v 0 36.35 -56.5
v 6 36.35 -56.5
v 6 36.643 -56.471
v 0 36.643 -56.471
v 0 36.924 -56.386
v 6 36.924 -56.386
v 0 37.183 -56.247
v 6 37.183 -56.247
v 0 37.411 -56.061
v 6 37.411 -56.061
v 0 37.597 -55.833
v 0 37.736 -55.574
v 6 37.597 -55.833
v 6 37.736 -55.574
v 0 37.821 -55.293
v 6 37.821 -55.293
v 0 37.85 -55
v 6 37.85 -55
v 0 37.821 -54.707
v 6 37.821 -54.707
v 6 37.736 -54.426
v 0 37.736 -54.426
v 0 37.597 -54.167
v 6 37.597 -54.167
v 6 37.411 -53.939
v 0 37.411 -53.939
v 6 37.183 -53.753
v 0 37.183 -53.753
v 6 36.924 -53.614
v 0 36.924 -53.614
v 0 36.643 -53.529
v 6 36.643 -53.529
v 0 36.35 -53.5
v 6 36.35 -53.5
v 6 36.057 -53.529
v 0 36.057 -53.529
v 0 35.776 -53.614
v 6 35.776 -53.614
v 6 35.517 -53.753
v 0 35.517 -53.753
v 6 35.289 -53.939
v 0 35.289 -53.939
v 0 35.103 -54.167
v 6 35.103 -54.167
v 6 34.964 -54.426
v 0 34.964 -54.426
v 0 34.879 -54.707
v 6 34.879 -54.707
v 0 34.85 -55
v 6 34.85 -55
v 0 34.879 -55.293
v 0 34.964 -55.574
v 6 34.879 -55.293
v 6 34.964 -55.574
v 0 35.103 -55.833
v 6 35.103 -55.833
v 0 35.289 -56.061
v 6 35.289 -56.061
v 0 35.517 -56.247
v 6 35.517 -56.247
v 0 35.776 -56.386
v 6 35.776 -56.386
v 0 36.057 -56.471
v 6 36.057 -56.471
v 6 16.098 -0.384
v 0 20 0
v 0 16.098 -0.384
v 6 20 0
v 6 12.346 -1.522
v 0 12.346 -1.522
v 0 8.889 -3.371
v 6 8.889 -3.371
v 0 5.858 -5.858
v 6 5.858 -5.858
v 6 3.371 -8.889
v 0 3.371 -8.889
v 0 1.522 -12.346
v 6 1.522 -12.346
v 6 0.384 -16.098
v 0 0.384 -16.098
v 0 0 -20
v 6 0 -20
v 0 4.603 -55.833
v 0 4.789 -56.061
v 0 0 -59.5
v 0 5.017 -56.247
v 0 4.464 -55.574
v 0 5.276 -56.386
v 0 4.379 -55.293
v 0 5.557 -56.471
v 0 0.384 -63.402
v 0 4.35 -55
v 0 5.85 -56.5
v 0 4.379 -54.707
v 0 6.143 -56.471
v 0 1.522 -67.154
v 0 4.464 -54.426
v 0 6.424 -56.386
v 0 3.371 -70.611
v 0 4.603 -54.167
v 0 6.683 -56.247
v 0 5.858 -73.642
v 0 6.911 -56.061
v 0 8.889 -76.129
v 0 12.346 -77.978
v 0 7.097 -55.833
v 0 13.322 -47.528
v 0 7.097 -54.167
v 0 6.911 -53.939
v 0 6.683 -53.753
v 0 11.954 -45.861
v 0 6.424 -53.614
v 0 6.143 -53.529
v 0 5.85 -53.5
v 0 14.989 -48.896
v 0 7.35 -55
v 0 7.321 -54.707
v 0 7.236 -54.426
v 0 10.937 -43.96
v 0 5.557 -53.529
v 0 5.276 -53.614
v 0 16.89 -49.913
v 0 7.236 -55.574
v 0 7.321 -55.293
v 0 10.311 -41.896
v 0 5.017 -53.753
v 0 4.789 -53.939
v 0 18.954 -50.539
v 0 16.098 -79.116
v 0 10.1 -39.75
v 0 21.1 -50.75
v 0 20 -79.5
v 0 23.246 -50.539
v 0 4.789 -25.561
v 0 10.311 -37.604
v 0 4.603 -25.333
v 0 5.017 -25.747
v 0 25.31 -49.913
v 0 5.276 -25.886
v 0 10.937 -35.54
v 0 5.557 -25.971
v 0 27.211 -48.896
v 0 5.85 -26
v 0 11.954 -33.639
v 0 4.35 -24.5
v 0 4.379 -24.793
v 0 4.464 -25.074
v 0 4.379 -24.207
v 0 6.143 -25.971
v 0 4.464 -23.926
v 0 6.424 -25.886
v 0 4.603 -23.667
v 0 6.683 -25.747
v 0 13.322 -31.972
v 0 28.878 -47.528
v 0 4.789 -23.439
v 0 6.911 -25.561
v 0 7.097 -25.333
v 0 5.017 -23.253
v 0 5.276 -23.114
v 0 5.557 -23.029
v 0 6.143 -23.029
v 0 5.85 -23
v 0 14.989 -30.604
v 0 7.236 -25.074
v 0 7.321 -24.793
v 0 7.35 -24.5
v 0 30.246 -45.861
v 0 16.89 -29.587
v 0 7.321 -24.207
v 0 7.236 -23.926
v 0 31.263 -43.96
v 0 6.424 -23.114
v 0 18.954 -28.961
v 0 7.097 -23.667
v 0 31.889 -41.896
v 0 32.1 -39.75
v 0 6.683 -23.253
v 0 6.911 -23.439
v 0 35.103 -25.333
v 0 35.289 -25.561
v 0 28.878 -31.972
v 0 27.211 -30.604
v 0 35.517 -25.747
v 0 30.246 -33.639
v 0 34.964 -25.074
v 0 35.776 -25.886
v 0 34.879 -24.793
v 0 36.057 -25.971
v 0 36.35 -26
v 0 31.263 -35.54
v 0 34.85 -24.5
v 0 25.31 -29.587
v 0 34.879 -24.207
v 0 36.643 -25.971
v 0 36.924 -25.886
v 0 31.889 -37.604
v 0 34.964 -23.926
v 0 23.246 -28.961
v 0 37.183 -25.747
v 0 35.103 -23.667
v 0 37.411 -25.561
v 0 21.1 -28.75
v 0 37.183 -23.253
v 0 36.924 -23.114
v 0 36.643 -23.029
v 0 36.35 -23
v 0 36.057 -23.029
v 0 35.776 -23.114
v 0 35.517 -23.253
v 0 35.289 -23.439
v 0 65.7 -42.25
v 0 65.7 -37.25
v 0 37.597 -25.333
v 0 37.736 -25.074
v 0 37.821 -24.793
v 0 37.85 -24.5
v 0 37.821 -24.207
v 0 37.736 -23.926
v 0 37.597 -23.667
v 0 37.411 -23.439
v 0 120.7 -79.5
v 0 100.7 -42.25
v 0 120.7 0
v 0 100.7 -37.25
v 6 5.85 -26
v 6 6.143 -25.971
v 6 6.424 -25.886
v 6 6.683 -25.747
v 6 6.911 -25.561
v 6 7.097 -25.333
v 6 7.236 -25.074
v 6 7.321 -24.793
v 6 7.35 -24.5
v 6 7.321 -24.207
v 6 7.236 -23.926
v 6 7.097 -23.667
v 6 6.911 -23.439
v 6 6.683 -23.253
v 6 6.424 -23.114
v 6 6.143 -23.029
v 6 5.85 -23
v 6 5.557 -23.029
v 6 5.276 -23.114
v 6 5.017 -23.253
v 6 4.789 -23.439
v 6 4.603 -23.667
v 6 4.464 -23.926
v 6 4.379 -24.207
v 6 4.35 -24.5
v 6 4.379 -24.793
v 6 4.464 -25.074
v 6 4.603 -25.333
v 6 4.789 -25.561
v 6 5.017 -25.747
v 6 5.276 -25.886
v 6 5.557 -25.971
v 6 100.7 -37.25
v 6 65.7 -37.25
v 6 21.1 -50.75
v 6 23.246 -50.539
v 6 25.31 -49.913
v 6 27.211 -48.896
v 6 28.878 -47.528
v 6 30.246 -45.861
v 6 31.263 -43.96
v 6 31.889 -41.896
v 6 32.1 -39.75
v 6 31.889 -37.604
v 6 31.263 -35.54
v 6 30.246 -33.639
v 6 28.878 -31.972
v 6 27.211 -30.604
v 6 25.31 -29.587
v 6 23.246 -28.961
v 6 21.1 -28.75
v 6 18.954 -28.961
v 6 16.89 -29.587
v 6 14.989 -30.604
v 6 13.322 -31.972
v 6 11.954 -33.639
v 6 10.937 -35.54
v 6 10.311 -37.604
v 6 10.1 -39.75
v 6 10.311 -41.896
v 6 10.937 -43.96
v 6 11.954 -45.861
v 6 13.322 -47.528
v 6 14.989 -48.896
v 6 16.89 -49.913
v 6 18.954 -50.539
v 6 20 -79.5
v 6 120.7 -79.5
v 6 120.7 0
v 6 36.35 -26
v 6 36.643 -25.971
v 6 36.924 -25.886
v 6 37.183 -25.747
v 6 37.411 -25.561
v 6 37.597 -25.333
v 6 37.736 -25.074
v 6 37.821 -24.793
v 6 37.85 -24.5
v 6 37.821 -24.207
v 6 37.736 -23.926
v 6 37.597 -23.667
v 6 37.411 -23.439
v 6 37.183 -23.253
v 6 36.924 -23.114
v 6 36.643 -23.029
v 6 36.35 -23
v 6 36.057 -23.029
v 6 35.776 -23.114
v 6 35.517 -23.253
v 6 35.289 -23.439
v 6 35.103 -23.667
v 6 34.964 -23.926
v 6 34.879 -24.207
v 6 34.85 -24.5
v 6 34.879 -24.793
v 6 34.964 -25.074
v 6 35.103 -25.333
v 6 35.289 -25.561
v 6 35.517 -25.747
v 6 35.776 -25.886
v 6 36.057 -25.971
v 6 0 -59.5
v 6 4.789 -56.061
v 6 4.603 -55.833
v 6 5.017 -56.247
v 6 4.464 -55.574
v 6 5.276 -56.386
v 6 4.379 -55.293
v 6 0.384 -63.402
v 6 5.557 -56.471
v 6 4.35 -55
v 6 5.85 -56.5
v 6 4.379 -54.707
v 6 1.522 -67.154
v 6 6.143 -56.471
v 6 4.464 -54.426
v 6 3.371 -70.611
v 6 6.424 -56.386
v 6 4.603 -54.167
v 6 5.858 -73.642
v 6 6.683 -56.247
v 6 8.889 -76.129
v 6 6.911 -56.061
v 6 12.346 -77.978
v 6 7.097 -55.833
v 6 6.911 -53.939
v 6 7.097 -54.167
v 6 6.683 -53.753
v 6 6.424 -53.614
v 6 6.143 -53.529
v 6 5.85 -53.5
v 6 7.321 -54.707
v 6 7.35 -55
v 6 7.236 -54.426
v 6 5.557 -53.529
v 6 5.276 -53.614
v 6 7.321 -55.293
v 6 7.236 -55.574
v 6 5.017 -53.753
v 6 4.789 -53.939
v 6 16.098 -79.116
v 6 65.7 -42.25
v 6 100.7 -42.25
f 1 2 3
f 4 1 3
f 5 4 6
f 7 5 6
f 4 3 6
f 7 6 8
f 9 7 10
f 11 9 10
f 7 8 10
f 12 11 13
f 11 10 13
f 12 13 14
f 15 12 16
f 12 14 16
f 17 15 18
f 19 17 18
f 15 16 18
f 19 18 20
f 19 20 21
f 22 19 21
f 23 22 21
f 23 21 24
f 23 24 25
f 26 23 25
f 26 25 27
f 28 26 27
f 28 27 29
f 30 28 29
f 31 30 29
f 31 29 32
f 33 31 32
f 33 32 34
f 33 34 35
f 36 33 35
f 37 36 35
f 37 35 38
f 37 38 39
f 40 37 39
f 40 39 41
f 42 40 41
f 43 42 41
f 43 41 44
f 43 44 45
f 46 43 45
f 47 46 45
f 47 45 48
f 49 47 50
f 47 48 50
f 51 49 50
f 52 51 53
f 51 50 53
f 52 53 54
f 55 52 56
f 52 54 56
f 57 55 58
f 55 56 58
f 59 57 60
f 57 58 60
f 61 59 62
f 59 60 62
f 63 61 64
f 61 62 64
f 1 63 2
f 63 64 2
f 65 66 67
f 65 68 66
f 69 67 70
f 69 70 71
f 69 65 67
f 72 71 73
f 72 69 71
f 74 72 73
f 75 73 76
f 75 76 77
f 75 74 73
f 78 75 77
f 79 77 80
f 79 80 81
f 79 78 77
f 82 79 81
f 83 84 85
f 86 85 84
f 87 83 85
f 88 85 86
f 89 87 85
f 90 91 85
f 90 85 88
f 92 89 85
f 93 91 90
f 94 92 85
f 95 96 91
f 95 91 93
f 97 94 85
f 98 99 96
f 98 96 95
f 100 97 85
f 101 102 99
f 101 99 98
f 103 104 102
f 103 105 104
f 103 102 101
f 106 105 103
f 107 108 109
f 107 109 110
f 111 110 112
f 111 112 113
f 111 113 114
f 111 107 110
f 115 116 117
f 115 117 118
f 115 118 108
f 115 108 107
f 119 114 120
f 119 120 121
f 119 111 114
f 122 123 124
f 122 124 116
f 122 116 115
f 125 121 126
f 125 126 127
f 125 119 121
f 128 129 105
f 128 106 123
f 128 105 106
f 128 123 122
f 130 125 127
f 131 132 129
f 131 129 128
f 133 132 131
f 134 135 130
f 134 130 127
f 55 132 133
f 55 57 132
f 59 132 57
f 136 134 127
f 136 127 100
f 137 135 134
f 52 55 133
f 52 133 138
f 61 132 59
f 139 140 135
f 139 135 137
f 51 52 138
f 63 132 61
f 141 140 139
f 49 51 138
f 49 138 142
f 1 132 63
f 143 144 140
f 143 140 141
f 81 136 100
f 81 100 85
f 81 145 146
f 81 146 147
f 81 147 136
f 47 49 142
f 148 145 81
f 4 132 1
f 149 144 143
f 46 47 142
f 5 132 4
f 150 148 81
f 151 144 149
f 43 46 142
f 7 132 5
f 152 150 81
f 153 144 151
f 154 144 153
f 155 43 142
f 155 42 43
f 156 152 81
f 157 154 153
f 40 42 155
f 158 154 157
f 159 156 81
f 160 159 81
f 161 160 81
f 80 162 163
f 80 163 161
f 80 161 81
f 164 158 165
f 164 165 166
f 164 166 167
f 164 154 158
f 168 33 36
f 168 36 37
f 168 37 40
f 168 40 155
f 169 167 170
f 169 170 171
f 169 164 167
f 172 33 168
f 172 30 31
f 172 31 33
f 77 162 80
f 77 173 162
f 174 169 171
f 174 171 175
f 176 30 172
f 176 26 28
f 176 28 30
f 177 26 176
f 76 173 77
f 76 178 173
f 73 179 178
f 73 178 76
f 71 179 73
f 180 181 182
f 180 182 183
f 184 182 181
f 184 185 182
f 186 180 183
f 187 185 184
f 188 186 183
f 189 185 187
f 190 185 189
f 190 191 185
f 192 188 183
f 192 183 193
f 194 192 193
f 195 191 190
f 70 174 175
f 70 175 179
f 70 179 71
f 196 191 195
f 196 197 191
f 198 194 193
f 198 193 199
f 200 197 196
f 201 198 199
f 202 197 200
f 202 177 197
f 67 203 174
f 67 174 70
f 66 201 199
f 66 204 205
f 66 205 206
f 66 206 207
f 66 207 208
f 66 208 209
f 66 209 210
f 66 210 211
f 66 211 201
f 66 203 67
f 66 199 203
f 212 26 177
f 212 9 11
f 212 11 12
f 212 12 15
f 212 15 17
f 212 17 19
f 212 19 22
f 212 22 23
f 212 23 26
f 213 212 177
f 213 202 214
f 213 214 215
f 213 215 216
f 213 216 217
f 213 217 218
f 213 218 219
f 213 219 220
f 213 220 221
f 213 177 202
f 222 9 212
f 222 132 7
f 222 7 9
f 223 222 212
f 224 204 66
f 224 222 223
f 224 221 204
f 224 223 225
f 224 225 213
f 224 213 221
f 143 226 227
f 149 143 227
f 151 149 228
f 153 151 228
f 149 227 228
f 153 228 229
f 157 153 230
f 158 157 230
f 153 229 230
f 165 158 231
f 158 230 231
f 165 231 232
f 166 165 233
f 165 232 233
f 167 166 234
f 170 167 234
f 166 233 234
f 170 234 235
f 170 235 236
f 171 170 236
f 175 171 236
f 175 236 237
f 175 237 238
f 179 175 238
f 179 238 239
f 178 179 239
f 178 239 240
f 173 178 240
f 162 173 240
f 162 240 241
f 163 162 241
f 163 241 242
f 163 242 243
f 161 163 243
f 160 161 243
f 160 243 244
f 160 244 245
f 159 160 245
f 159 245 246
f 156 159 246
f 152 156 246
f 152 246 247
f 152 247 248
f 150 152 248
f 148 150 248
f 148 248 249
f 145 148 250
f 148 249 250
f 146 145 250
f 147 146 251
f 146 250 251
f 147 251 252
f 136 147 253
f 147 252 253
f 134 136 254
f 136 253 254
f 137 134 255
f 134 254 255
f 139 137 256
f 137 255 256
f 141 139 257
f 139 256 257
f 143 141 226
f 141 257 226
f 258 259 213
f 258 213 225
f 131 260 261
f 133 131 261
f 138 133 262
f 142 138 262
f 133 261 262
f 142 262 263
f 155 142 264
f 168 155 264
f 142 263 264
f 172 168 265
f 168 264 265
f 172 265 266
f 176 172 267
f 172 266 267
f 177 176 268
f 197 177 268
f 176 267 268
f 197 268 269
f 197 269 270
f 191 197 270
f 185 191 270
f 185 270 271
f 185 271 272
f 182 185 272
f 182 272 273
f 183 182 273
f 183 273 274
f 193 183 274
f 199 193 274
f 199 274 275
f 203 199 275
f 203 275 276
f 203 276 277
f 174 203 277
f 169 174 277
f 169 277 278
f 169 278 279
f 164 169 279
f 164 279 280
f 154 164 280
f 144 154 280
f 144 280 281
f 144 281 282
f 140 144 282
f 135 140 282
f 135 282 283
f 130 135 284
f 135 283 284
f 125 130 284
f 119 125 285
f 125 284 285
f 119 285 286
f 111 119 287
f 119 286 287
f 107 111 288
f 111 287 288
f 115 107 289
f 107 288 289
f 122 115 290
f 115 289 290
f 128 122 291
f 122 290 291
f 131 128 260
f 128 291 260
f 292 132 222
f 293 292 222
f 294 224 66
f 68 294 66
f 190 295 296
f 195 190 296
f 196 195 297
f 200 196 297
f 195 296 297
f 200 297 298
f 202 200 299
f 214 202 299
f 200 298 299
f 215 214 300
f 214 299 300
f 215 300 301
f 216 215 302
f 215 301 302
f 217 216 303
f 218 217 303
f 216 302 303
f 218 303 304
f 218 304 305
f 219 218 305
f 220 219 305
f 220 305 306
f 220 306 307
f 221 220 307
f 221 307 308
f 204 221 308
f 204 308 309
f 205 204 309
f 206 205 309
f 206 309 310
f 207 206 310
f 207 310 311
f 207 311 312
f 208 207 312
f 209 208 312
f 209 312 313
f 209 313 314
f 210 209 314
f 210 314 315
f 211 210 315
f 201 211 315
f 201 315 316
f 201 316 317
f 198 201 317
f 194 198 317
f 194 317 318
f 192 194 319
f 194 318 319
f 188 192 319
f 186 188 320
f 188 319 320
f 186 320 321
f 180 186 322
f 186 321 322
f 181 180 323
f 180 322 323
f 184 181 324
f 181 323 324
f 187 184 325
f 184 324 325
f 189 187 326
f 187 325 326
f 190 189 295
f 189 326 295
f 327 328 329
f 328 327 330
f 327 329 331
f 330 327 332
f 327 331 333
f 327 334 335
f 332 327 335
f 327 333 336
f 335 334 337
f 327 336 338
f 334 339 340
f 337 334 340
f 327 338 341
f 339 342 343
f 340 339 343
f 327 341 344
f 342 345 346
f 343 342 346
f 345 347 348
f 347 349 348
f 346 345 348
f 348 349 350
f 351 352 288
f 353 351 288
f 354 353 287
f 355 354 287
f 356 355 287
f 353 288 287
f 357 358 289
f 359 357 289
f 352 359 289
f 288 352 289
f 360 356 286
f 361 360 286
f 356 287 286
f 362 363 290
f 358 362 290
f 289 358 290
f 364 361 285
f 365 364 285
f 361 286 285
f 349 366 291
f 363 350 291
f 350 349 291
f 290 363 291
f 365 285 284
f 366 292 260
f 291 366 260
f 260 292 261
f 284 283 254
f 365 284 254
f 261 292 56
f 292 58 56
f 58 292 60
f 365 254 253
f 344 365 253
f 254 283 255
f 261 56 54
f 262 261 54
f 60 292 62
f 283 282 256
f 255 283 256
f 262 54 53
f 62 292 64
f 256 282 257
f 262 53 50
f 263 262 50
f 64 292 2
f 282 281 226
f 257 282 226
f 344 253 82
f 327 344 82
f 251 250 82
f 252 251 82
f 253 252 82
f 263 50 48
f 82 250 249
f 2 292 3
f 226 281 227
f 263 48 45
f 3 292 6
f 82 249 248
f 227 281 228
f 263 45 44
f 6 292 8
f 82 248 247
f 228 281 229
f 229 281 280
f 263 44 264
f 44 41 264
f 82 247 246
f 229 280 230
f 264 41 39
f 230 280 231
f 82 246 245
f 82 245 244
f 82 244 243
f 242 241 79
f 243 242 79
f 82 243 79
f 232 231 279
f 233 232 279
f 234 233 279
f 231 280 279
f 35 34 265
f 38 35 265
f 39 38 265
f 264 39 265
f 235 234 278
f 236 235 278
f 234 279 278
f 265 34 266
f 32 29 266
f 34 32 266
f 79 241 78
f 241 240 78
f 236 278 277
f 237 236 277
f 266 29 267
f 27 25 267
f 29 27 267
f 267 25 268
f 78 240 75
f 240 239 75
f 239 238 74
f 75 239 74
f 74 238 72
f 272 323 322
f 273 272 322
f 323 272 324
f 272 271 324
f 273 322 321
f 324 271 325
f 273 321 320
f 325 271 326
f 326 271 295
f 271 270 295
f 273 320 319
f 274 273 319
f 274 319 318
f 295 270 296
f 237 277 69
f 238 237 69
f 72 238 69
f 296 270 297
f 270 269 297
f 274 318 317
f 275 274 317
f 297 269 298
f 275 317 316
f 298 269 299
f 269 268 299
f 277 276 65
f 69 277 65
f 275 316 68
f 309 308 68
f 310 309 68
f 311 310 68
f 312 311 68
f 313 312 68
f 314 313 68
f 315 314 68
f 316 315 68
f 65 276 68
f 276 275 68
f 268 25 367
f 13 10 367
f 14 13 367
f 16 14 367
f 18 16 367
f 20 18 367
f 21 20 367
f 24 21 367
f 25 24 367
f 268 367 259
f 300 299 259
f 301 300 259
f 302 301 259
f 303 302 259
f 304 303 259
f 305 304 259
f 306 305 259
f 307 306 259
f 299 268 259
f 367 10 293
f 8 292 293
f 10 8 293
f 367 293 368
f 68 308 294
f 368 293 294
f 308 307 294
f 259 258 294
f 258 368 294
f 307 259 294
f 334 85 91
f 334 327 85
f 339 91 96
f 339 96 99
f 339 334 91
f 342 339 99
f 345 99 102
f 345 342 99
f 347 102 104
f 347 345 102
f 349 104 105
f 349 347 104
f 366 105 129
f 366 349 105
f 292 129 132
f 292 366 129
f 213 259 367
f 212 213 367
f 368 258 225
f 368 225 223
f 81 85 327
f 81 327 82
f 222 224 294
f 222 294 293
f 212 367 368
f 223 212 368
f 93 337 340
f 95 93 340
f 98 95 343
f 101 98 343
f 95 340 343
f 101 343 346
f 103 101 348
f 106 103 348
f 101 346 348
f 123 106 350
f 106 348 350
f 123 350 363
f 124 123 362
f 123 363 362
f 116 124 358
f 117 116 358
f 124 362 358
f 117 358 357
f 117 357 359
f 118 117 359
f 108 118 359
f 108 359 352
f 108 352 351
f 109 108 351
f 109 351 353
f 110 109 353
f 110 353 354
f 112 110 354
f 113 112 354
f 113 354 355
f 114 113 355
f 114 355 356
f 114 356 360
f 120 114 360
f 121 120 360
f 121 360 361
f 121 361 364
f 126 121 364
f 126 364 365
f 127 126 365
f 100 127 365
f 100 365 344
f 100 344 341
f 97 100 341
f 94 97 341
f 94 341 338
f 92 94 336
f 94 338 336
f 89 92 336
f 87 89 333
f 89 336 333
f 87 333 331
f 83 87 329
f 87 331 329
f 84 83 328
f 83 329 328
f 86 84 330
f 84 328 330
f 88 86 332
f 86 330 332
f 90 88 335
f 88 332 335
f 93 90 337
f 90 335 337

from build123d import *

# Parameters (mm, degrees)
BOSS_EXTRUDE2_DEPTH = 6
SKETCH2_W           = 5
SKETCH2_H           = 35
CUT_EXTRUDE1_DEPTH  = 10
SKETCH3_R           = 11
SKETCH3_R_2         = 1.5
CUT_EXTRUDE2_DEPTH  = 10
FILLET1_R           = 20


with BuildPart() as part:
    # Sketch1 → Boss-Extrude2 (new body)
    with BuildSketch(Plane(origin=(0, 0, 0), x_dir=(0, 0, -1), z_dir=(1, 0, 0))):
        Polygon((0, 43), (0, 120.7), (79.5, 120.7), (79.5, 43), (79.5, 0), (0, 0), align=None)
    extrude(amount=BOSS_EXTRUDE2_DEPTH)

    # Sketch2 → Cut-Extrude1 (cut)
    with BuildSketch(Plane(origin=(6, 0, 0), x_dir=(0, 0, -1), z_dir=(1, 0, 0))):
        with Locations((39.75, 83.2)):
            Rectangle(SKETCH2_W, SKETCH2_H)
    extrude(amount=-CUT_EXTRUDE1_DEPTH, mode=Mode.SUBTRACT)

    # Sketch3 → Cut-Extrude2 (cut)
    with BuildSketch(Plane(origin=(6, 0, 0), x_dir=(0, 0, -1), z_dir=(1, 0, 0))):
        with Locations((39.75, 21.1)):
            Circle(SKETCH3_R)
        with Locations((24.5, 36.35)):
            Circle(SKETCH3_R_2)
        with Locations((55, 36.35)):
            Circle(SKETCH3_R_2)
        with Locations((55, 5.85)):
            Circle(SKETCH3_R_2)
        with Locations((24.5, 5.85)):
            Circle(SKETCH3_R_2)
    extrude(amount=-CUT_EXTRUDE2_DEPTH, mode=Mode.SUBTRACT)

    # Fillet1
    fillet1_edges = [part.edges().sort_by_distance(p)[0] for p in [
        (3, 0, 0),
        (3, 0, -79.5),
    ]]
    fillet(fillet1_edges, radius=FILLET1_R)


solid = part.part
